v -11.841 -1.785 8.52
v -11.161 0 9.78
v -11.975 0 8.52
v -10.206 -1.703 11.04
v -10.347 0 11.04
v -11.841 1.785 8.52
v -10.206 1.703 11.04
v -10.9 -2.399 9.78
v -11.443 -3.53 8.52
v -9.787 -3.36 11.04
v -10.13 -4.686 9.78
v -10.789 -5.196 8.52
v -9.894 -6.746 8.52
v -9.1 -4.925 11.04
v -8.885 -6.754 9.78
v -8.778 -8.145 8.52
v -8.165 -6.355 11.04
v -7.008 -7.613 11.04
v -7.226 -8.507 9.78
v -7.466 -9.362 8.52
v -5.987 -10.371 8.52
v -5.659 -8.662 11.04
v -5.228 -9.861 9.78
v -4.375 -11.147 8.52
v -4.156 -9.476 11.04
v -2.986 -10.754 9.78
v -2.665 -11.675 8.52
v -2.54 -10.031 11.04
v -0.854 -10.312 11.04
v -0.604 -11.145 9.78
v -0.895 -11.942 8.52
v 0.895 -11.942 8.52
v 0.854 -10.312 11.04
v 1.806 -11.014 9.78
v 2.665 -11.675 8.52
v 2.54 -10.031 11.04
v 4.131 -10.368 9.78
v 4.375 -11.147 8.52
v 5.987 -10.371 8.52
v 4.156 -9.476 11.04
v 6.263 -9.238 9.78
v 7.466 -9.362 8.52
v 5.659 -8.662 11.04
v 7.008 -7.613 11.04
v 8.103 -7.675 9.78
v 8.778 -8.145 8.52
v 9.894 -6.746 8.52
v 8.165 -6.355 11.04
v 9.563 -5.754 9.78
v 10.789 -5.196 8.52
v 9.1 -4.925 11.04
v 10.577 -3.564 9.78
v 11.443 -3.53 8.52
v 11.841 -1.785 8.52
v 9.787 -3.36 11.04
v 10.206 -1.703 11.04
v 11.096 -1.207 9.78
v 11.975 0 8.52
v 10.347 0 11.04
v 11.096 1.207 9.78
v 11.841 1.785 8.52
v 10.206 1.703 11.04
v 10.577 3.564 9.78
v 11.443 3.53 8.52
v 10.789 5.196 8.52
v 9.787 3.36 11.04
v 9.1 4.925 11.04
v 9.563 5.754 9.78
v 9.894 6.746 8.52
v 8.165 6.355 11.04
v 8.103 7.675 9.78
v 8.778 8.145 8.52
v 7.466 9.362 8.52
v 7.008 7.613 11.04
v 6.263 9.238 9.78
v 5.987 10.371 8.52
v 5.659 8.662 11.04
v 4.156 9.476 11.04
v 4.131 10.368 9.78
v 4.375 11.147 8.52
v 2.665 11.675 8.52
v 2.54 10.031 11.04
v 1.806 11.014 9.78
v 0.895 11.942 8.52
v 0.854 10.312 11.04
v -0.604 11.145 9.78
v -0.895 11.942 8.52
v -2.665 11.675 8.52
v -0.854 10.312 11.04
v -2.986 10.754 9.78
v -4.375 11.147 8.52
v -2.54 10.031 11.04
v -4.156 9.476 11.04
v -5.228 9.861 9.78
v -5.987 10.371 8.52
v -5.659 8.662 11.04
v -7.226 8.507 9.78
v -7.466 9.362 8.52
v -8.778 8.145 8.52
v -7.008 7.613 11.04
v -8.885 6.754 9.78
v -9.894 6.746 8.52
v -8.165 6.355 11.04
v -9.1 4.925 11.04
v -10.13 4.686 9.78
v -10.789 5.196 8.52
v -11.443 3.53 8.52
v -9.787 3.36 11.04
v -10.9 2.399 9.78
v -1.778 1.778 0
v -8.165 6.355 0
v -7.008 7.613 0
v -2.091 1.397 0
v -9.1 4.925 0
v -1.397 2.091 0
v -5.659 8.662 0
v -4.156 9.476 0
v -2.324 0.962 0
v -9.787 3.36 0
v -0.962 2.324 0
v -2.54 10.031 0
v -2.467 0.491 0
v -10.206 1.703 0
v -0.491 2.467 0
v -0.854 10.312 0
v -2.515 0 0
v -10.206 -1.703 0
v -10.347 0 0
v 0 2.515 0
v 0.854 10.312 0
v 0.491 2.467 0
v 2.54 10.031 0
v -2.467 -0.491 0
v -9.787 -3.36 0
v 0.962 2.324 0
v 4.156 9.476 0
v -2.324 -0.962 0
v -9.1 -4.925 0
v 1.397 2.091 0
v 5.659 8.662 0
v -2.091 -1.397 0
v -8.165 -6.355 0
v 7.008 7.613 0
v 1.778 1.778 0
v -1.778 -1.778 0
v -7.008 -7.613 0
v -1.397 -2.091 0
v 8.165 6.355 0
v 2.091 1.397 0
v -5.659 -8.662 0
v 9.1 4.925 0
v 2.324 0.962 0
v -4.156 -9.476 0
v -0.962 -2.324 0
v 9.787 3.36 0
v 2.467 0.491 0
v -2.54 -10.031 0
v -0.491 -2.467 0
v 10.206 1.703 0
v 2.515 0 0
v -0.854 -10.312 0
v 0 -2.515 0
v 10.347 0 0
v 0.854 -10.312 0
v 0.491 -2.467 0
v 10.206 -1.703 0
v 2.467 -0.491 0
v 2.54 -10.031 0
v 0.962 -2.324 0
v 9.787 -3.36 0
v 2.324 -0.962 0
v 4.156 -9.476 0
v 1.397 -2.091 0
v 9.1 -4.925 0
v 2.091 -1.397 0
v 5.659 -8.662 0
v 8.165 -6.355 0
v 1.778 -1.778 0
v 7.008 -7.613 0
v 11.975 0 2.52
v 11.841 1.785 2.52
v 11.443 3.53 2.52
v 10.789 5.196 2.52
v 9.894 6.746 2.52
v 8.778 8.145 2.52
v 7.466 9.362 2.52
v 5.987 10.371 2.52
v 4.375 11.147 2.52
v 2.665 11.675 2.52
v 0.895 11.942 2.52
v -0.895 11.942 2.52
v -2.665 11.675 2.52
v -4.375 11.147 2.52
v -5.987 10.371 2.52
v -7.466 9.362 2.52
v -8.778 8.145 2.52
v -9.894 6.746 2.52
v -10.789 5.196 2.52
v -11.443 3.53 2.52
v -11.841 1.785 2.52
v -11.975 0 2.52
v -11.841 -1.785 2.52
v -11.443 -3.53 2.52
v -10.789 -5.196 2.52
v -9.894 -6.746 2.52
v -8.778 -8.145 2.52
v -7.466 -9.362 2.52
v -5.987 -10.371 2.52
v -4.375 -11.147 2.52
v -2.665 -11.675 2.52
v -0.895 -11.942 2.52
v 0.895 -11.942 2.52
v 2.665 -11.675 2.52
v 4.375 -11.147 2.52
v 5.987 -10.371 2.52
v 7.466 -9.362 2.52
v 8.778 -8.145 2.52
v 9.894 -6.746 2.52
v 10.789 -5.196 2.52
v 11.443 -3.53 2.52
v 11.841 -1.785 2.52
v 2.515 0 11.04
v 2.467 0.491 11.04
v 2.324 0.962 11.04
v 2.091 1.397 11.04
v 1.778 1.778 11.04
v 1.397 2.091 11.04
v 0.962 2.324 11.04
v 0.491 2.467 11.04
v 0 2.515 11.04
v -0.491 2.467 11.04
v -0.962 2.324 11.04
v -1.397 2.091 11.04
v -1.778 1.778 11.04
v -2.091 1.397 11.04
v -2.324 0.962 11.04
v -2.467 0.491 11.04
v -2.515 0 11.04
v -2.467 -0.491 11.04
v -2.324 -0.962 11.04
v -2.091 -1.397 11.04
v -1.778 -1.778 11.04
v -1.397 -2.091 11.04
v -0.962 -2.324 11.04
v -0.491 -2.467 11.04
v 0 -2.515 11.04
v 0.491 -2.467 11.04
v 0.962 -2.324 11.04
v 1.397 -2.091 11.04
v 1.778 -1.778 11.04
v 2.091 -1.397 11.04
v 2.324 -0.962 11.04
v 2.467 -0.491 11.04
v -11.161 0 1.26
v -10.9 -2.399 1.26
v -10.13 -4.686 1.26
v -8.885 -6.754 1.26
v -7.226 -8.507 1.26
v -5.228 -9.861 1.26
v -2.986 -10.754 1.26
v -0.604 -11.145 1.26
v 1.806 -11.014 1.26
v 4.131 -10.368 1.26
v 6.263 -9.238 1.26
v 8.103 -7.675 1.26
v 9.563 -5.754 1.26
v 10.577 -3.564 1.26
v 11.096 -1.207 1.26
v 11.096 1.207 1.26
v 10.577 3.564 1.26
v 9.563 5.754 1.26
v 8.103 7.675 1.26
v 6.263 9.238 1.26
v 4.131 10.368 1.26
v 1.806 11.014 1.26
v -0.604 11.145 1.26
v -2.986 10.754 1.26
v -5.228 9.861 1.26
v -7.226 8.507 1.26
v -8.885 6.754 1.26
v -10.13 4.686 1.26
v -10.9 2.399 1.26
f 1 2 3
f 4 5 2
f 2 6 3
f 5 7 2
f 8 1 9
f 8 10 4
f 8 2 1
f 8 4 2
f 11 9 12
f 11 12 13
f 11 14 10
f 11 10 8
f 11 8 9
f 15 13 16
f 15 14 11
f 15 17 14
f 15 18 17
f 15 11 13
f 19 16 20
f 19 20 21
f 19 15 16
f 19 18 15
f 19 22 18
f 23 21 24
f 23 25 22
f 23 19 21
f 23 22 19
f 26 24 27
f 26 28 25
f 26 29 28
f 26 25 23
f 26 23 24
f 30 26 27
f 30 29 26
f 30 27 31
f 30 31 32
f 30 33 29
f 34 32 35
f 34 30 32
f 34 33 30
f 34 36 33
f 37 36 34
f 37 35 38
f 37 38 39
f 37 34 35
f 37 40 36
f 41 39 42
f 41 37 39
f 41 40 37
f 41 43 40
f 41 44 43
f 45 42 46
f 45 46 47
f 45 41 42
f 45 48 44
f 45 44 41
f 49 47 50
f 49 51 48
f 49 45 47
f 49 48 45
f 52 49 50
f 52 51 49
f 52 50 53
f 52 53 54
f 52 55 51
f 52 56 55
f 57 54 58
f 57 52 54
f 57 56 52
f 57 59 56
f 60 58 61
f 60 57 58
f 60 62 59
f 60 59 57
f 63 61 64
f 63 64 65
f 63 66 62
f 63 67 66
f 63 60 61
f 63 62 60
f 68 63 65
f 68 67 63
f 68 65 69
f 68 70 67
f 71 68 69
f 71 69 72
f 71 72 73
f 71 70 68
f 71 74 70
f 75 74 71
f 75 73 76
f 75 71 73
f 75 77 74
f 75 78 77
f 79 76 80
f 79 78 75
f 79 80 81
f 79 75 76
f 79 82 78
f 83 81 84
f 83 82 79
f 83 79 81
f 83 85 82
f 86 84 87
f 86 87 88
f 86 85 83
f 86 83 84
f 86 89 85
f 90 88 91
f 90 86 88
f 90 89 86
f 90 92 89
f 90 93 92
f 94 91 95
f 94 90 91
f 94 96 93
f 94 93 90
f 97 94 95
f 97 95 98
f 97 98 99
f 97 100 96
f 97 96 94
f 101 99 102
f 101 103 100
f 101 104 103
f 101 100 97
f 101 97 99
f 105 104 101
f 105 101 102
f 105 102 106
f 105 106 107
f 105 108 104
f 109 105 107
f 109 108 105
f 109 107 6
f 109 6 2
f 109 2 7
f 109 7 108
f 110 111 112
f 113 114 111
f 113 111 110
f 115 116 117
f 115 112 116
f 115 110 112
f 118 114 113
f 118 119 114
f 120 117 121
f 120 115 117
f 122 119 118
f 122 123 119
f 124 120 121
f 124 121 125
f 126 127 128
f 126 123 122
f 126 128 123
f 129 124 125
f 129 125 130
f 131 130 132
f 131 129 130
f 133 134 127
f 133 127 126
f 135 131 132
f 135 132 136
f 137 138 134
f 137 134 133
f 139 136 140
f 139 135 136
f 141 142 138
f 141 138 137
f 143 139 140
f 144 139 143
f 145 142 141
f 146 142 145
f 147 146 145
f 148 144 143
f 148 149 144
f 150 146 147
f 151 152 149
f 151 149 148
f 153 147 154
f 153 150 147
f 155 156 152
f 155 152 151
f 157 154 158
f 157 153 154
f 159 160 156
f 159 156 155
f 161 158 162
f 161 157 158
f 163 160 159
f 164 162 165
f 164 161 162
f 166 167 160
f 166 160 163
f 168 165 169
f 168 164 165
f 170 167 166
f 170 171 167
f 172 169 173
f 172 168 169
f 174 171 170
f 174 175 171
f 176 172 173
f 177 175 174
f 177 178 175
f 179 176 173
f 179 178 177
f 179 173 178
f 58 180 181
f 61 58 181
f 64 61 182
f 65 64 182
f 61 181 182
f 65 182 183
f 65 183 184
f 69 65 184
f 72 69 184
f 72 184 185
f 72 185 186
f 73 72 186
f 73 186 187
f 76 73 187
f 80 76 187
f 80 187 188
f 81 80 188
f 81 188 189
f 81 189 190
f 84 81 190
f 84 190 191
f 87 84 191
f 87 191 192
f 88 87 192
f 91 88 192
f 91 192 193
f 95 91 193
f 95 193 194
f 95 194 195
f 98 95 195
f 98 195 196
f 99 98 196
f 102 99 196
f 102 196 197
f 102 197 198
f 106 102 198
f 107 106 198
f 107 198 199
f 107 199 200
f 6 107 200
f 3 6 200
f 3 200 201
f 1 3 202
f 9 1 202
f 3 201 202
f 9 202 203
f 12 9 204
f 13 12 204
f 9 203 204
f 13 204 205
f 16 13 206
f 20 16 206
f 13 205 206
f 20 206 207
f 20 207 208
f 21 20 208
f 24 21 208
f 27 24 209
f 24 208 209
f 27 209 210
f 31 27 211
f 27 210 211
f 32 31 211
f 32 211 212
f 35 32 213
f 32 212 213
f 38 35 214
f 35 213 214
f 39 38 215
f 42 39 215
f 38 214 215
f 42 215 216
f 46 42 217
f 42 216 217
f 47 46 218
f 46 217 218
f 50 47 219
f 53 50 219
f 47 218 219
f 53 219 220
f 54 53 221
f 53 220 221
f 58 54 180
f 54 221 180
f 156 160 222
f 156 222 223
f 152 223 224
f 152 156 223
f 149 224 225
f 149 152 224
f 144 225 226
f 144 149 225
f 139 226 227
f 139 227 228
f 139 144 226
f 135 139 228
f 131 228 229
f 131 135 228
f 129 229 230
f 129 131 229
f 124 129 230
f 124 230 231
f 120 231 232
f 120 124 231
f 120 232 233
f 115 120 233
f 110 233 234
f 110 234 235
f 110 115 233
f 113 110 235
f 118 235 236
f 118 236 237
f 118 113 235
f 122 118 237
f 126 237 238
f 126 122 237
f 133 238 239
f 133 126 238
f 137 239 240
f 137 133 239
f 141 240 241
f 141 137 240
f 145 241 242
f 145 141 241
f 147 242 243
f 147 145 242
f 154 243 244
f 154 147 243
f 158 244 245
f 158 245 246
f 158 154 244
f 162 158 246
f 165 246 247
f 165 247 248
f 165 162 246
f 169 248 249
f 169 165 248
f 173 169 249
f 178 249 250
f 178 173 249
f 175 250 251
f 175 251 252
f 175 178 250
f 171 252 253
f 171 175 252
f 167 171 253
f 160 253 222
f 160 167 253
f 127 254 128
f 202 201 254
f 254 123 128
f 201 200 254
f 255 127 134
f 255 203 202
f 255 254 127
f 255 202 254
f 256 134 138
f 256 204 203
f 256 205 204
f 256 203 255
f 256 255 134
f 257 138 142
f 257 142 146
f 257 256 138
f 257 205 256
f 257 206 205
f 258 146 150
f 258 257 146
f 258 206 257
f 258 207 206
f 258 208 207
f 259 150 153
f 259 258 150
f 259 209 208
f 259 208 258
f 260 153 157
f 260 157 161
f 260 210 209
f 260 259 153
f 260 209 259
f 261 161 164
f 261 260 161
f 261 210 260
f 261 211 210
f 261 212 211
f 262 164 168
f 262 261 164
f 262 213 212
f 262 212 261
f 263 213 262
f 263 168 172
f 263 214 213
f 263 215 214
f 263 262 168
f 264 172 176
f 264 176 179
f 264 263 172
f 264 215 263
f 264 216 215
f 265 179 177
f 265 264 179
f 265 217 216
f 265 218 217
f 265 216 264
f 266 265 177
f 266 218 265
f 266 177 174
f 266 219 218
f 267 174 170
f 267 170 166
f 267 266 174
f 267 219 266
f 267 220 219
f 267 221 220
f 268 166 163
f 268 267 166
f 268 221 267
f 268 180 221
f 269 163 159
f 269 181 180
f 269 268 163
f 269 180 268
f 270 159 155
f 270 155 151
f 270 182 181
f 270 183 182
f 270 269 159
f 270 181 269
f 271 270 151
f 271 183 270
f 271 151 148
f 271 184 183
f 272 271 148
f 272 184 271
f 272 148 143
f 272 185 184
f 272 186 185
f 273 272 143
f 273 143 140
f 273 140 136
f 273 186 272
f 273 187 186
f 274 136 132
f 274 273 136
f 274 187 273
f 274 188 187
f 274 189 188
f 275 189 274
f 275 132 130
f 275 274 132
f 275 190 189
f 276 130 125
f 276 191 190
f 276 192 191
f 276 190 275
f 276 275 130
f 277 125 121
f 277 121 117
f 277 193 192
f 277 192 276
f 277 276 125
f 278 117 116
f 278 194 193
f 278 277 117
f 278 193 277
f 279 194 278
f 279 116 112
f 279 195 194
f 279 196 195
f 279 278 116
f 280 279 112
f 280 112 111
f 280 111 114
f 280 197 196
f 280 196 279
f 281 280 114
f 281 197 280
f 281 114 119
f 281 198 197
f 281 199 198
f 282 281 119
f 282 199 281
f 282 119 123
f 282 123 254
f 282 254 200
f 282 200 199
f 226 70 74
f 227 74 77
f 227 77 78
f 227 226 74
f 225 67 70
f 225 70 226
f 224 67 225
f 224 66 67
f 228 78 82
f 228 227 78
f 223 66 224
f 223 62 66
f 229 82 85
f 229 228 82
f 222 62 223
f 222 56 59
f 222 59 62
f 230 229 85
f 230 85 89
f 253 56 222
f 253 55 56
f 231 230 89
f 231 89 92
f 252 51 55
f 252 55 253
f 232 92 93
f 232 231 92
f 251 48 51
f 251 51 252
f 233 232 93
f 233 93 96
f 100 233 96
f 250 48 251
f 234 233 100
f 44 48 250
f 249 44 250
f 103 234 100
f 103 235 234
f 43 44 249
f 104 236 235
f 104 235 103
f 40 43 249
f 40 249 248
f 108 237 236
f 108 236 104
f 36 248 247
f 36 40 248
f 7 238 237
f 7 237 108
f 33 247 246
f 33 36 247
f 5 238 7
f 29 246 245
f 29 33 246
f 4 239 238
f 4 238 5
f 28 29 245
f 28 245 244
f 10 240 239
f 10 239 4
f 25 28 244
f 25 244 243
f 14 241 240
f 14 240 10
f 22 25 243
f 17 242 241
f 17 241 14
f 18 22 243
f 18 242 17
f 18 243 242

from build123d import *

# Parameters (mm, degrees)
SKETCH1_R           = 11.975
BOSS_EXTRUDE1_DEPTH = 11.04
SKETCH2_R           = 2.515
CUT_EXTRUDE1_DEPTH  = 11.04


with BuildPart() as part:
    # Sketch1 → Boss-Extrude1 (new body)
    with BuildSketch(Plane.XY):
        Circle(SKETCH1_R)
    extrude(amount=BOSS_EXTRUDE1_DEPTH)

    # Sketch2 → Cut-Extrude1 (cut)
    with BuildSketch(Plane.XY):
        Circle(SKETCH2_R)
    extrude(amount=CUT_EXTRUDE1_DEPTH, mode=Mode.SUBTRACT)

    # Sketch3 → Cut-Revolve4 (revolve, cut)
    with BuildSketch(Plane(origin=(0, 0, 0), x_dir=(1, 0, 0), z_dir=(0, 1, 0))):
        Polygon((-7.292190974, 0), (-10.347240804, 0), (-11.975, -2.52), (-11.975, -8.52), (-10.347240804, -11.04), (-6.458257889, -11.04), (-5.810000317, -18.325003181), (-21.89407965, -6.340173639), (-13.168343432, 5.370083322), align=None)
    revolve(axis=Axis((0, 0, -5.854641455), (0, 0, 1)), mode=Mode.SUBTRACT)


solid = part.part
